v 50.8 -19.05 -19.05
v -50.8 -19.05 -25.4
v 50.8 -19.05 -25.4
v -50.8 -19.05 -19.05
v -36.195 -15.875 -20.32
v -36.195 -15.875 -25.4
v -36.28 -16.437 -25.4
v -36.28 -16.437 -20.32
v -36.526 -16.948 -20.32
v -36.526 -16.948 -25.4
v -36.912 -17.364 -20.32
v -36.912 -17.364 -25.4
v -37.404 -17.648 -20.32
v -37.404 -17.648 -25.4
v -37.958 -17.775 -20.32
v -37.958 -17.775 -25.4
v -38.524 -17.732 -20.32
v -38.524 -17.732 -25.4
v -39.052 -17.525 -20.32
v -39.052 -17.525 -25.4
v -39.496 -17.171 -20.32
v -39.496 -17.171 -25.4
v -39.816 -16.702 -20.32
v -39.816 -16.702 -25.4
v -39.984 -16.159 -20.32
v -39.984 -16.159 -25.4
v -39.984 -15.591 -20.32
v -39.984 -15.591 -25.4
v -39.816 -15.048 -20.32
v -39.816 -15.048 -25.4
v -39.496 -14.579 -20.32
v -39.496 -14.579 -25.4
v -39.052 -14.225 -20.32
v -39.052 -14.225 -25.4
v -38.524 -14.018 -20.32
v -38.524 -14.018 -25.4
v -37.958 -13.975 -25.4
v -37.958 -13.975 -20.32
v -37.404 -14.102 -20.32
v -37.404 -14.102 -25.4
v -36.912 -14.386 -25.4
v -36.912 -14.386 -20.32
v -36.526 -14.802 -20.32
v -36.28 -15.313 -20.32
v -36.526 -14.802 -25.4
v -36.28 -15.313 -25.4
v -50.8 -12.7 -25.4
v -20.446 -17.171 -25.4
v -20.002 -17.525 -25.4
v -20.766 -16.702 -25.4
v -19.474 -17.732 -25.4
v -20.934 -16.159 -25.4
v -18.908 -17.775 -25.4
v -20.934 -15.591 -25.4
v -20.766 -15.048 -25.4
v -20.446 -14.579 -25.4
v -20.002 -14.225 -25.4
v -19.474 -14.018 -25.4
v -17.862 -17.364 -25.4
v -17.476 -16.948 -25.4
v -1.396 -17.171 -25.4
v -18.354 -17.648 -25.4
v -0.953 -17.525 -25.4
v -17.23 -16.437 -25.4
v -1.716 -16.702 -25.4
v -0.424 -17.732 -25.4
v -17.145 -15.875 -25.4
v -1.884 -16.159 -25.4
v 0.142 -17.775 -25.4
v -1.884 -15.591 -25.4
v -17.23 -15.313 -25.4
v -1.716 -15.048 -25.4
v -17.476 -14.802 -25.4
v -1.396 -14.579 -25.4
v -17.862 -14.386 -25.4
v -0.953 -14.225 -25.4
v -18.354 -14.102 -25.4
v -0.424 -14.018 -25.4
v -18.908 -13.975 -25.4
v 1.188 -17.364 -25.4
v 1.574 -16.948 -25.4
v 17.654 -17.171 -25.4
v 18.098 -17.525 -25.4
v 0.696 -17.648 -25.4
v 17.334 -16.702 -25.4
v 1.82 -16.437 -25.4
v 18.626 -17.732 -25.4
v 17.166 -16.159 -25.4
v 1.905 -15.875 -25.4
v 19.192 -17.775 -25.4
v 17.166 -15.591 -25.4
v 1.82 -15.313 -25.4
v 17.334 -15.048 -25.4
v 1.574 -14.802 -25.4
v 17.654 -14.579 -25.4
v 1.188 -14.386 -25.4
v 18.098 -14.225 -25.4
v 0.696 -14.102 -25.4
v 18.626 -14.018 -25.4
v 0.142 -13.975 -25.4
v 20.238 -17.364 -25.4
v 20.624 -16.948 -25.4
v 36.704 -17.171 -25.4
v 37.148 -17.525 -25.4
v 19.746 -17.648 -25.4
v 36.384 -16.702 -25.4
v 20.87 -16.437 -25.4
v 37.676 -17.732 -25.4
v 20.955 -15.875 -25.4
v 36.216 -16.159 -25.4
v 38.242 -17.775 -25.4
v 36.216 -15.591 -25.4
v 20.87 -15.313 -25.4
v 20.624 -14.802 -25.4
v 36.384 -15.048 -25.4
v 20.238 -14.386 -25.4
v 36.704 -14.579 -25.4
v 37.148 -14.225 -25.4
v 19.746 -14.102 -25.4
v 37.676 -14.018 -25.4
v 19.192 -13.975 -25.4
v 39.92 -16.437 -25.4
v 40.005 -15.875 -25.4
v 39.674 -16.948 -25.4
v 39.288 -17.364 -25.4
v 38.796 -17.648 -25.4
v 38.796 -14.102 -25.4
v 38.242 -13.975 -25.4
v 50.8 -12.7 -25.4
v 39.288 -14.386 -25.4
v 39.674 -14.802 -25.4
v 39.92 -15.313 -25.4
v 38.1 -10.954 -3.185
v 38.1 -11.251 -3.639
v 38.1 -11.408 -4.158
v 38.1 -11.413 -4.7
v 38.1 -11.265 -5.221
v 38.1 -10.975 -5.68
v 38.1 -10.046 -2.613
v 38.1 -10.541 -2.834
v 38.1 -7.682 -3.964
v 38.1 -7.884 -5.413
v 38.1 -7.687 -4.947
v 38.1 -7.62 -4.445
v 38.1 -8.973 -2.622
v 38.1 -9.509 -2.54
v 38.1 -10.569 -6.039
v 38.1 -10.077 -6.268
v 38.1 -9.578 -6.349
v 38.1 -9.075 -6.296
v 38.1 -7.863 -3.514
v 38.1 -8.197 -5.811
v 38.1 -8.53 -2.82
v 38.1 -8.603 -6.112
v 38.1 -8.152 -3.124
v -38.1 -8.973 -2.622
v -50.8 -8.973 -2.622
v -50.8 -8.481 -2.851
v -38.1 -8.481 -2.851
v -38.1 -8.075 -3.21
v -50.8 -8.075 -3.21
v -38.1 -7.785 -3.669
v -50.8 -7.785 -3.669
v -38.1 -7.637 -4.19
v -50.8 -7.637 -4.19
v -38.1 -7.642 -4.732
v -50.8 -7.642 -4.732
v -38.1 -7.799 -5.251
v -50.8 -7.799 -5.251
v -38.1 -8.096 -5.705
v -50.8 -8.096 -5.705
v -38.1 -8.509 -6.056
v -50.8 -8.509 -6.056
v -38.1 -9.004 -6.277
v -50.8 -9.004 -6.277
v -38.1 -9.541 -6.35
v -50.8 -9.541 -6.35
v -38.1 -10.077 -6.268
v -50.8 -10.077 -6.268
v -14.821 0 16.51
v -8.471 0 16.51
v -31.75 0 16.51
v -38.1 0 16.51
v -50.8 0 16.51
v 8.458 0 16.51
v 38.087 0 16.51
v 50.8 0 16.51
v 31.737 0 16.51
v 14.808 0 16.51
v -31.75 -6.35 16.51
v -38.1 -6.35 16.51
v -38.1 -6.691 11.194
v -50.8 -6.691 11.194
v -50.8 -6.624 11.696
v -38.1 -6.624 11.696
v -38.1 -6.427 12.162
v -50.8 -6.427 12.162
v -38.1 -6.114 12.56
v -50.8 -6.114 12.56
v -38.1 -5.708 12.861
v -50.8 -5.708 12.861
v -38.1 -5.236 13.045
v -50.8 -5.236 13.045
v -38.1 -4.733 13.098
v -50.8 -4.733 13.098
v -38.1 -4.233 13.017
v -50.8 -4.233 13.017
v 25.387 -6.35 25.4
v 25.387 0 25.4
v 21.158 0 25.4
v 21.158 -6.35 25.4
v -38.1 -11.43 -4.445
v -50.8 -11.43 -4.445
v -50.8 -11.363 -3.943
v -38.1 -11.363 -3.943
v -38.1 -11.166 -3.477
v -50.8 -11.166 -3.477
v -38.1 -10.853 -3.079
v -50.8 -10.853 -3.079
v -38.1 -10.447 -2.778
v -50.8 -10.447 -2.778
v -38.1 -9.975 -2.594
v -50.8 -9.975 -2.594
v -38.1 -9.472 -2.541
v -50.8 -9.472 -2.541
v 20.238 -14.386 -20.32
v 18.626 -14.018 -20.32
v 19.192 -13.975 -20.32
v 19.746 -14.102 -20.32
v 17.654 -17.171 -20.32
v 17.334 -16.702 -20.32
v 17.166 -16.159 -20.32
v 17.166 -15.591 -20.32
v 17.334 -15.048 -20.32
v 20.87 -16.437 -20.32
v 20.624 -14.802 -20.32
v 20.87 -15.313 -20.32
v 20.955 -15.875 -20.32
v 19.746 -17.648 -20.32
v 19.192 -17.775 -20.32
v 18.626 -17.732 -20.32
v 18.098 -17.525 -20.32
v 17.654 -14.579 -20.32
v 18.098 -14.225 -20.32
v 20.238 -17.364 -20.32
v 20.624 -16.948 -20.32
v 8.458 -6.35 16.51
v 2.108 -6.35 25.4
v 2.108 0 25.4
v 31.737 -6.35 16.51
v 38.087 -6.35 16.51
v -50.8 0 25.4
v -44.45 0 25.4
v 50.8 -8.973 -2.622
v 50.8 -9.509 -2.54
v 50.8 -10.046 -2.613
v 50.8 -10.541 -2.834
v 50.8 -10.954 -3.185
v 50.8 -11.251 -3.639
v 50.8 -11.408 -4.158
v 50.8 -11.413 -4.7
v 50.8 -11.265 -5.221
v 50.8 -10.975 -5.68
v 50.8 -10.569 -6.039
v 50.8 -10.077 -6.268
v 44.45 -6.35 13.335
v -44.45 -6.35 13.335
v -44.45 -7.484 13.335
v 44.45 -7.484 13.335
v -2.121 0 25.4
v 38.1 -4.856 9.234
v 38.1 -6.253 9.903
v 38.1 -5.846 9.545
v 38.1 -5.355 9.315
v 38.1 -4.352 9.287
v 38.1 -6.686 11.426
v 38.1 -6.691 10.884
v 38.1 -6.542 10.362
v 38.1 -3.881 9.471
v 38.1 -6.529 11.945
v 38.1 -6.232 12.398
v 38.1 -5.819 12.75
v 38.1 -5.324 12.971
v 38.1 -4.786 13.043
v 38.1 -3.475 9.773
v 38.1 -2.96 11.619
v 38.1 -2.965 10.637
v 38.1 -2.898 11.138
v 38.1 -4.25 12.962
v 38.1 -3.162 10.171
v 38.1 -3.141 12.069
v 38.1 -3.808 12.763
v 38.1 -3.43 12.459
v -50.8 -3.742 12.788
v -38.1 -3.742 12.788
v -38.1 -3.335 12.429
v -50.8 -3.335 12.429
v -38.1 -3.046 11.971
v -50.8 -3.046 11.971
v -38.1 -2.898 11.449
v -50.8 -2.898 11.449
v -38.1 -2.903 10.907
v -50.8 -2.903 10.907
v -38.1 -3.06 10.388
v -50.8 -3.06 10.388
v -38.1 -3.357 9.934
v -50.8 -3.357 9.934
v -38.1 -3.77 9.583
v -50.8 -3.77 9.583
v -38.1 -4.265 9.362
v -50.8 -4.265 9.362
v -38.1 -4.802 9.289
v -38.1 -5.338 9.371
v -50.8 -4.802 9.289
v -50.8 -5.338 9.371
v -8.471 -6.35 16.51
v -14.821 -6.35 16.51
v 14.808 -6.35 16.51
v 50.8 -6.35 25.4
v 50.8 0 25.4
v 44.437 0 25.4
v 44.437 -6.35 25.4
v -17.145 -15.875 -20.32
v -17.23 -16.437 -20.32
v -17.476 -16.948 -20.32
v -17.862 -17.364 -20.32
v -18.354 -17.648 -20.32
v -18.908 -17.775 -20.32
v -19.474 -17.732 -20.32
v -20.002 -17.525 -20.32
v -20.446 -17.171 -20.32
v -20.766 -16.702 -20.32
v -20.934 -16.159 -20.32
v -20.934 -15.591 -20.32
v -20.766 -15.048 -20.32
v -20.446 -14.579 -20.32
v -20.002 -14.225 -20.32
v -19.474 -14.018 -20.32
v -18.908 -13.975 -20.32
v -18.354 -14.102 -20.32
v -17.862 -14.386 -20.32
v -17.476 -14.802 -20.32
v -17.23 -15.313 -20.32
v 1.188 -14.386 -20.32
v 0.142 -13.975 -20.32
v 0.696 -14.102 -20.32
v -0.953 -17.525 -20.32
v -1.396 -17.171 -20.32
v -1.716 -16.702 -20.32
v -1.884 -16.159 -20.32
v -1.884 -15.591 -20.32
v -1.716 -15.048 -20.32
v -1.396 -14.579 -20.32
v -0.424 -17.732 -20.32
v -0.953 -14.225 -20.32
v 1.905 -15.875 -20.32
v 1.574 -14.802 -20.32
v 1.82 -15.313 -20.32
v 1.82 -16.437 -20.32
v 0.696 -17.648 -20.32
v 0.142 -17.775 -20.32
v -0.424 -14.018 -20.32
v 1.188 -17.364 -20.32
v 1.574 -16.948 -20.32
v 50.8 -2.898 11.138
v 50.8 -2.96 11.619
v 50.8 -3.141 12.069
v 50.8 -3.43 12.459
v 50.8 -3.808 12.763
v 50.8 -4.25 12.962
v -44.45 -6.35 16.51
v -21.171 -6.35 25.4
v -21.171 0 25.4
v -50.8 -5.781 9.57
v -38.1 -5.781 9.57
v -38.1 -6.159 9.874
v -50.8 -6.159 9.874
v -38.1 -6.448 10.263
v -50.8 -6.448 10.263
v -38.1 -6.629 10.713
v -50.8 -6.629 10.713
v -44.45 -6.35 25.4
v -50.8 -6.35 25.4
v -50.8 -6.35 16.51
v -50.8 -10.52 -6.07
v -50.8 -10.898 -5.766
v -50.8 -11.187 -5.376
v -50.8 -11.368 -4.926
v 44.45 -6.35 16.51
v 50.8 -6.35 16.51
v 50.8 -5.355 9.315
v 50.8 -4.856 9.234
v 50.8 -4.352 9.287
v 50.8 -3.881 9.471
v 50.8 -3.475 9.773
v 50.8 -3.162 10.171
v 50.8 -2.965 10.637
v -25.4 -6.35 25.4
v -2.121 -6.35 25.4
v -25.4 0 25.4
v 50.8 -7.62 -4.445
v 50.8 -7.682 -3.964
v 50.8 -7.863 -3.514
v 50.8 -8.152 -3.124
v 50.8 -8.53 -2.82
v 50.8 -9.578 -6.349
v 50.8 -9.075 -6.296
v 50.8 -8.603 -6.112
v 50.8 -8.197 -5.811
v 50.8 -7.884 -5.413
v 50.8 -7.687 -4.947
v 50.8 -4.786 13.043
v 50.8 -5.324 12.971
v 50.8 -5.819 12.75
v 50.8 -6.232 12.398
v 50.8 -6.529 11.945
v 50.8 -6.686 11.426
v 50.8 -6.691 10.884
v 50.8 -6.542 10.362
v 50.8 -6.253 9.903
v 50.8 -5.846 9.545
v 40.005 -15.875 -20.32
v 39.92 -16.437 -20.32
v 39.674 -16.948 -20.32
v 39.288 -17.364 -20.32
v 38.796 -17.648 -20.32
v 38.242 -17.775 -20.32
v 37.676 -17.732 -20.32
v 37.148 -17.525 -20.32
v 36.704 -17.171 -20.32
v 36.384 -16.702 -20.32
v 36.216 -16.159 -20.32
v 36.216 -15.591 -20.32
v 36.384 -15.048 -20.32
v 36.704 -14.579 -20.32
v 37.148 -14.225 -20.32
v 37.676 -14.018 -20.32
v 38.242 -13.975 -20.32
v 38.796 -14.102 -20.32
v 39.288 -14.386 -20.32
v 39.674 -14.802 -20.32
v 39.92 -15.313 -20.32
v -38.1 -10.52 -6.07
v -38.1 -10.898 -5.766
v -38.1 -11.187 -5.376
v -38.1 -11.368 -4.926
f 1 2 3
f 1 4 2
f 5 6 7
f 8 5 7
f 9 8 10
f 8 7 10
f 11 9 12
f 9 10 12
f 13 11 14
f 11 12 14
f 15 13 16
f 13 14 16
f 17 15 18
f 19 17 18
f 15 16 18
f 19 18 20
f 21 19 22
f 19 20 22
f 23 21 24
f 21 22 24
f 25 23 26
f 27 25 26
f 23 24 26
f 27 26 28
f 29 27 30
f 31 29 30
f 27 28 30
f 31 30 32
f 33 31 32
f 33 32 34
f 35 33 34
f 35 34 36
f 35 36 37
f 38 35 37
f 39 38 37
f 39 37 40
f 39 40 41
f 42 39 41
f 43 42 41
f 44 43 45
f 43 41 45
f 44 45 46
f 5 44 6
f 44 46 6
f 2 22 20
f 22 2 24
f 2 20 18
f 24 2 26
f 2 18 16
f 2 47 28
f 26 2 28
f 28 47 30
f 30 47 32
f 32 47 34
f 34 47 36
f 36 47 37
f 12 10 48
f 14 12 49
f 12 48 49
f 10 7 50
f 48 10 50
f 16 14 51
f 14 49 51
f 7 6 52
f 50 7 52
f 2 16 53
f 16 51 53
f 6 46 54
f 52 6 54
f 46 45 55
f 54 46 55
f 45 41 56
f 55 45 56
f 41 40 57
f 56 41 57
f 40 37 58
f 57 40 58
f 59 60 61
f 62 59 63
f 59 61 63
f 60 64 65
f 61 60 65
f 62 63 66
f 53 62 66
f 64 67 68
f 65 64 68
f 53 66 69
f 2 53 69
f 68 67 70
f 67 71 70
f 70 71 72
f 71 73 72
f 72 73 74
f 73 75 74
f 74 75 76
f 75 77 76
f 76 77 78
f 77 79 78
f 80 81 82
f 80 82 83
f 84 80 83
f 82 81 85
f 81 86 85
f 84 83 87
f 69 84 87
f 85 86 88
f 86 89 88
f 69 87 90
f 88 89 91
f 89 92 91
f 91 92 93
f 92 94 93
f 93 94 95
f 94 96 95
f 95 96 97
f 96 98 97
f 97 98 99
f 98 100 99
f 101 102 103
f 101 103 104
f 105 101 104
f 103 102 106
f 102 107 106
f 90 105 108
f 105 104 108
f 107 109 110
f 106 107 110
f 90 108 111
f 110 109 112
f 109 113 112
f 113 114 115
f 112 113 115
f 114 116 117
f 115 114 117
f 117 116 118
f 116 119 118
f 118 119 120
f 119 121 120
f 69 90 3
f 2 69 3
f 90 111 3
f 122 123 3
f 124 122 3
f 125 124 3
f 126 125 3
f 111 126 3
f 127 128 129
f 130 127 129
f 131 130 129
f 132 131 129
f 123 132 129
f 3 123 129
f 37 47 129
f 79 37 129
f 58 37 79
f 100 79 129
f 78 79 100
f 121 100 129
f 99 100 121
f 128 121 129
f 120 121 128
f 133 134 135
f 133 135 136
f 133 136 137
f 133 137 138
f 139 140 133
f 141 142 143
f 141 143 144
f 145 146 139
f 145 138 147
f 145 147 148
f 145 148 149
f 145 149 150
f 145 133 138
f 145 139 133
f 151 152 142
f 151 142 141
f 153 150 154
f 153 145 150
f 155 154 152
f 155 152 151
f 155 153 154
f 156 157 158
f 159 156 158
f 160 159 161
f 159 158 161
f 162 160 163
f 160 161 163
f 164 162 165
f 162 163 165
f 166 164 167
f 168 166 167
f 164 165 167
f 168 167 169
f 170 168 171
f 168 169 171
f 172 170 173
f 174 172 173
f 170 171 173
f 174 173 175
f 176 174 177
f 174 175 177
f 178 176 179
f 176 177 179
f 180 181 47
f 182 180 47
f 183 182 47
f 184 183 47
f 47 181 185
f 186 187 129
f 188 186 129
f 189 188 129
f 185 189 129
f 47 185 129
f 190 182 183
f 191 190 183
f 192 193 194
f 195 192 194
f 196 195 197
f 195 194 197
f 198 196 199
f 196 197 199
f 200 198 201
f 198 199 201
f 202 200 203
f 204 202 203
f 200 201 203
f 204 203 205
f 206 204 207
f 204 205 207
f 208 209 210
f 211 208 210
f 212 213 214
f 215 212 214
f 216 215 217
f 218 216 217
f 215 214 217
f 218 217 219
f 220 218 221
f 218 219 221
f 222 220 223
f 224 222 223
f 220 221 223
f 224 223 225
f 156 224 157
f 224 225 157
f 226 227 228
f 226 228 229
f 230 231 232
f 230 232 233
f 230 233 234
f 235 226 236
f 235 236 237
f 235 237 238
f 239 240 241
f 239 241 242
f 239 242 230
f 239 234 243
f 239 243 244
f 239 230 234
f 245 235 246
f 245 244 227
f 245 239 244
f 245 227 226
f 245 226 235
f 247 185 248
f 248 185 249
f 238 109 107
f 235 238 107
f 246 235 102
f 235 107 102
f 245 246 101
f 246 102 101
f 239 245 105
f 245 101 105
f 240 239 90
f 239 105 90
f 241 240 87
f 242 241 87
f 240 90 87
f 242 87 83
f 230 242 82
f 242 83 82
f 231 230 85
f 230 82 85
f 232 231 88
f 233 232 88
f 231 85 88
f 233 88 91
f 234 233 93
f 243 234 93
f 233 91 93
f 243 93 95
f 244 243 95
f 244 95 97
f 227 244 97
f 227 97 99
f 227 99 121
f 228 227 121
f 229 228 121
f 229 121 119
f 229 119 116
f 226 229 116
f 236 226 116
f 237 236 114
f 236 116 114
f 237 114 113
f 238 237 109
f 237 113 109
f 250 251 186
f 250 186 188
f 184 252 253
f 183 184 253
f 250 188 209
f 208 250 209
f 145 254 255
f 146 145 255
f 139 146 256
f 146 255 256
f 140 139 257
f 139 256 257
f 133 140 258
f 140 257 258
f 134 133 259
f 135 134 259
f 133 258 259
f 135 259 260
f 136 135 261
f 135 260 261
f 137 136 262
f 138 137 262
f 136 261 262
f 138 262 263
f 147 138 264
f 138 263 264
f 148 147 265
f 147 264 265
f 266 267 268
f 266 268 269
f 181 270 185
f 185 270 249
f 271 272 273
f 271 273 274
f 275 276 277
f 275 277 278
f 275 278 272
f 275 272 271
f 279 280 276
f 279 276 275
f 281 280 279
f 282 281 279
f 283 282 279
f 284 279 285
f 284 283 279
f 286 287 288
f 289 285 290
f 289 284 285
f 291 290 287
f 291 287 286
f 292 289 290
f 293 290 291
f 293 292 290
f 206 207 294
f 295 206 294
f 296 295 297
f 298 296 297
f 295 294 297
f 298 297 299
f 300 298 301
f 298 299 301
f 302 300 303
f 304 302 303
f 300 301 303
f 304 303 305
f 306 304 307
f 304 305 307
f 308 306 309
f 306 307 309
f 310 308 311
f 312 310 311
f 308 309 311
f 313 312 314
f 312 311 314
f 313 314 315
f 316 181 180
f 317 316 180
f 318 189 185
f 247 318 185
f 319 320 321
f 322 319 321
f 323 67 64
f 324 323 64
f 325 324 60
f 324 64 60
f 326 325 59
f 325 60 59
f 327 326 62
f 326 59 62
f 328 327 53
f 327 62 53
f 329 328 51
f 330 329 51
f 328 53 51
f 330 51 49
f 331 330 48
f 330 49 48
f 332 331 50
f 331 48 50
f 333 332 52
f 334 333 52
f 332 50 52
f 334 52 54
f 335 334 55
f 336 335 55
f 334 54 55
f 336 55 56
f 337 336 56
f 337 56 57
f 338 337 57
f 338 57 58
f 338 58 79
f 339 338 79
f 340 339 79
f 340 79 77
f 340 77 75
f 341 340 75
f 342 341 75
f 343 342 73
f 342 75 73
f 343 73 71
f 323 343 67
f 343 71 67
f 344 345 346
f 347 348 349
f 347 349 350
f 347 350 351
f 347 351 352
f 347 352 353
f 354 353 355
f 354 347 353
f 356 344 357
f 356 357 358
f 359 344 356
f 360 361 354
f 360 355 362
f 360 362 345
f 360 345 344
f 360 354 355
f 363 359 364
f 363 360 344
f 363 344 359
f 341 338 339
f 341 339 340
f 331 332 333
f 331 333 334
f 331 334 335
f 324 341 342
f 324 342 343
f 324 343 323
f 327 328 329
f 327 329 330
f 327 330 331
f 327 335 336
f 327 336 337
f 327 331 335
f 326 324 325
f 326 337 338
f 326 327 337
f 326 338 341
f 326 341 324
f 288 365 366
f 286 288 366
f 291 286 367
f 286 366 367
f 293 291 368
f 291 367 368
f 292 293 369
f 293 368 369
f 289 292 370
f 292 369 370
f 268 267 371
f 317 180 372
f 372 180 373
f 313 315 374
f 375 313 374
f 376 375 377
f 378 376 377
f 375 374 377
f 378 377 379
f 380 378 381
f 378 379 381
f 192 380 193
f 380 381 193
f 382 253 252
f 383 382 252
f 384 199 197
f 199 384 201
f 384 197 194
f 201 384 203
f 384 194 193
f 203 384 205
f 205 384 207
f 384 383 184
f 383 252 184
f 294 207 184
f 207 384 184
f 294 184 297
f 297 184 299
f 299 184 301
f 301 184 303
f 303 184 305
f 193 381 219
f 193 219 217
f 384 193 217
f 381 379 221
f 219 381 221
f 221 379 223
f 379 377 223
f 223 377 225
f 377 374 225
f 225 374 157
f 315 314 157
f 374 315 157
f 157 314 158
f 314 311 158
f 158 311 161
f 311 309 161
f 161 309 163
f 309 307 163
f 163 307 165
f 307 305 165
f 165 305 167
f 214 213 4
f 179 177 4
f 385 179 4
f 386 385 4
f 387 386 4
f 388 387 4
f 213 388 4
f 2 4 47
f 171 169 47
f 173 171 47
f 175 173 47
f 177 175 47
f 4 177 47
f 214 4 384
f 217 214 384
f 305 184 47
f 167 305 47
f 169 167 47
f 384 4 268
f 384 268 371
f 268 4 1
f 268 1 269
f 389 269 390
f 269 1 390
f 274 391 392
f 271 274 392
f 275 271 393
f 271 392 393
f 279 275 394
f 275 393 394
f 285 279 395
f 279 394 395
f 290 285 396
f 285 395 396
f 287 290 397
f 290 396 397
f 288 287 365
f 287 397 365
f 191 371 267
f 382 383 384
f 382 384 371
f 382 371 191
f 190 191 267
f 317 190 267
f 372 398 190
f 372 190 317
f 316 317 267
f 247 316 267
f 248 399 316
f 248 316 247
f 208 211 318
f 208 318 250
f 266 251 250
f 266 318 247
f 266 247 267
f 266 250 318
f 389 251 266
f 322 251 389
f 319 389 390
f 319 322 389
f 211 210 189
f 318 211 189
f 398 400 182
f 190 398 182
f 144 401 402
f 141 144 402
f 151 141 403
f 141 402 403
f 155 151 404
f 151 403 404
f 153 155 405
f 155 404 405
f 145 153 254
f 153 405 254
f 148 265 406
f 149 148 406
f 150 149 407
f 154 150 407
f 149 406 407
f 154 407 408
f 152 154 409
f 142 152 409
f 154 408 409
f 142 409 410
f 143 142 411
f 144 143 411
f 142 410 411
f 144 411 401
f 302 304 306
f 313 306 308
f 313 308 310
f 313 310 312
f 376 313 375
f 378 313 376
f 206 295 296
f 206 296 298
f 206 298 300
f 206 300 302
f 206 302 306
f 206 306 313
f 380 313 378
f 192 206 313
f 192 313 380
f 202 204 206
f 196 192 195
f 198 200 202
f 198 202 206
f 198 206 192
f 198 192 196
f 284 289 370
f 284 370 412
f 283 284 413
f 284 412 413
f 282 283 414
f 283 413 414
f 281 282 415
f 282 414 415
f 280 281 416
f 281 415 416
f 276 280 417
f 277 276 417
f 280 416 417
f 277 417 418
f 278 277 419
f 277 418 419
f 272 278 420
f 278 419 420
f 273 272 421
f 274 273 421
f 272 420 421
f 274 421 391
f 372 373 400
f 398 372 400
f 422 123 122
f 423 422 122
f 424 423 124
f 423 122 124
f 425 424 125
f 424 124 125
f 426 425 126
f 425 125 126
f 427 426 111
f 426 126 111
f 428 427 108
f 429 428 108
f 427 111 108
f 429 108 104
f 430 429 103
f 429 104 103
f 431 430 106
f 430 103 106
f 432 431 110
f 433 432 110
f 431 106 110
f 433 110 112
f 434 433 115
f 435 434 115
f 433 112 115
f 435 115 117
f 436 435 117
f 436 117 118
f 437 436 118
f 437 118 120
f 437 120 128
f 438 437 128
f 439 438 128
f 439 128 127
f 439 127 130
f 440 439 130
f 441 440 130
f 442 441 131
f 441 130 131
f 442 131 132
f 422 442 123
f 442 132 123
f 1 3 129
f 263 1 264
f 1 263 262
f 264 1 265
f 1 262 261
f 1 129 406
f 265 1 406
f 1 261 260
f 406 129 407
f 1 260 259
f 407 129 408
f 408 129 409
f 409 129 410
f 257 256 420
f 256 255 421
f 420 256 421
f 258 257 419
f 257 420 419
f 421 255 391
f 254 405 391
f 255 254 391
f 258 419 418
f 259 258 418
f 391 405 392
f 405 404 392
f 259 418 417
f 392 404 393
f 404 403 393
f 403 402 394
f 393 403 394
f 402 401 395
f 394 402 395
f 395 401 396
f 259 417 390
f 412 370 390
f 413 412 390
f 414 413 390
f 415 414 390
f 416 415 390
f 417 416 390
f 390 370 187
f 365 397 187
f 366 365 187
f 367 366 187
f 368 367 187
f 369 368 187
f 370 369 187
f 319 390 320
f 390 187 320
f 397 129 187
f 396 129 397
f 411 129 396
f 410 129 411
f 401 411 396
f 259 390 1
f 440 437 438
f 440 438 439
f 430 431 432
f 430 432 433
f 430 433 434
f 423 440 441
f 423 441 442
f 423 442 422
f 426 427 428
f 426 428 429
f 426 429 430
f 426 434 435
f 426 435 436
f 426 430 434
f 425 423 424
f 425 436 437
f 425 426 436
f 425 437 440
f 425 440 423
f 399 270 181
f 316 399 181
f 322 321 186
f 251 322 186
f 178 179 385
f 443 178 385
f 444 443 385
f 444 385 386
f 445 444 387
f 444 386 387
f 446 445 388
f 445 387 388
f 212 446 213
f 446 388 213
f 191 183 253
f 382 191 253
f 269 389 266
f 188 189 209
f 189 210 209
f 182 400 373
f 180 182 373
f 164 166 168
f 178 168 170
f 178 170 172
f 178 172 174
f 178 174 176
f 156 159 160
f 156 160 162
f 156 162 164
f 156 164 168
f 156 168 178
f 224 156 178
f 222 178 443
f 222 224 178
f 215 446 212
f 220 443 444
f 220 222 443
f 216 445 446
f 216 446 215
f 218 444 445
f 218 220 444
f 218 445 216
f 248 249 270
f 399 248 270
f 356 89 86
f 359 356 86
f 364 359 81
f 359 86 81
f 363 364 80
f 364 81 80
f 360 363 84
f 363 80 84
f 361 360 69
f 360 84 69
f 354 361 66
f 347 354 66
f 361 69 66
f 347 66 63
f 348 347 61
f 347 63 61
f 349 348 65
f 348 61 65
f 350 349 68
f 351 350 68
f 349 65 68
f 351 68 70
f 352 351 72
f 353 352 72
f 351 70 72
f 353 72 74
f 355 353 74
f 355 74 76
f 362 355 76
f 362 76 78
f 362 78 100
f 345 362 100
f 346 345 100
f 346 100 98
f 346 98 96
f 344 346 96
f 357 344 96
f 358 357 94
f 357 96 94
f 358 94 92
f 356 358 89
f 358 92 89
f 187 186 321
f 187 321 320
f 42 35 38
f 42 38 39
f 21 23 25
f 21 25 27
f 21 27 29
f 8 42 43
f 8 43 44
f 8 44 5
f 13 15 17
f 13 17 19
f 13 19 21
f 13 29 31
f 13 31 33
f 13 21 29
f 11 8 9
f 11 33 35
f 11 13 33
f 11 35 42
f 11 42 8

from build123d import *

# Parameters (mm, degrees)
F1_DEPTH  = 6.35
F0_W      = 88.9
F0_H      = 32.385
F2_DEPTH  = 19.05
F5_DEPTH  = 101.6
F6_DEPTH  = 12.7
F9_DEPTH  = 12.7
F11_R     = 1.905
F12_DEPTH = 5.08


# Not quite as in the source:
# - a feature names something its author has since deleted; it is built from what else it names


with BuildPart() as f1:
    # F0 (on Front) → F1 (new body)
    with BuildSketch(Plane.XZ):
        Polygon((50.8, 16.51), (50.8, 25.4), (44.4373, 25.4), (38.0873, 16.51), (31.7373, 16.51), (25.3873, 25.4), (21.1582, 25.4), (14.8082, 16.51), (8.4582, 16.51), (2.1082, 25.4), (-2.1209, 25.4), (-8.4709, 16.51), (-14.8209, 16.51), (-21.1709, 25.4), (-25.4, 25.4), (-31.75, 16.51), (-38.1, 16.51), (-44.45, 25.4), (-50.8, 25.4), (-50.8, 16.51), (-44.45, 16.51), (-44.45, 13.335), (44.45, 13.335), (44.45, 16.51), align=None)
    extrude(amount=F1_DEPTH)

    # F0 (on Front) → F2 (join)
    with BuildSketch(Plane.XZ):
        Polygon((50.8, -25.4), (50.8, 16.51), (44.45, 16.51), (44.45, 13.335), (44.45, -19.05), (-44.45, -19.05), (-44.45, 13.335), (-44.45, 16.51), (-50.8, 16.51), (-50.8, -25.4), (-44.45, -25.4), (44.45, -25.4), align=None)
        with Locations((0, -2.8575)):
            Rectangle(F0_W, F0_H)
    extrude(amount=F2_DEPTH)

    # F4 (on offset) → F5 (cut)
    with BuildSketch(Plane.YZ.offset(50.8)):
        Polygon((-12.7, -25.4), (0, -25.4), (0, 16.51), align=None)
        Polygon((-6.35, 16.51), (-6.35, 25.4), (-19.05, 25.4), (-19.05, -19.05), align=None)
    extrude(amount=-F5_DEPTH, mode=Mode.SUBTRACT)

    # F4 (on offset) → F6 (cut)
    with BuildSketch(Plane.YZ.offset(50.8)):
        with BuildLine():
            ThreePointArc((-8.972535912, -2.6218685096), (-11.3481314904, -3.892535912), (-10.077464088, -6.2681314904))
            ThreePointArc((-10.077464088, -6.2681314904), (-8.3899711651, -5.9749459284), (-7.62, -4.445))
            ThreePointArc((-7.62, -4.445), (-7.9950540716, -3.3099711651), (-8.972535912, -2.6218685096))
        make_face()
        with BuildLine():
            ThreePointArc((-2.897765424, 11.1383741007), (-3.2728194956, 12.2734029356), (-4.250301336, 12.9615055911))
            ThreePointArc((-4.250301336, 12.9615055911), (-6.6258969145, 11.6908381887), (-5.3552295121, 9.3152426102))
            ThreePointArc((-5.3552295121, 9.3152426102), (-3.6677365891, 9.6084281723), (-2.897765424, 11.1383741007))
        make_face()
    extrude(amount=-F6_DEPTH, mode=Mode.SUBTRACT)

    # F8 (on offset) → F9 (cut)
    with BuildSketch(Plane(origin=(-50.8, 0, 0), x_dir=(0, -1, 0), z_dir=(-1, 0, 0))):
        with BuildLine():
            ThreePointArc((4.2333912752, 13.0173087917), (2.9627238728, 10.6417132133), (5.3383194513, 9.3710458109))
            ThreePointArc((5.3383194513, 9.3710458109), (6.3158012916, 10.0591484663), (6.6908553632, 11.1941773013))
            ThreePointArc((6.6908553632, 11.1941773013), (5.9208841982, 12.7241232297), (4.2333912752, 13.0173087917))
        make_face()
        with BuildLine():
            ThreePointArc((8.972535912, -2.6218685096), (7.7018685096, -4.997464088), (10.077464088, -6.2681314904))
            ThreePointArc((10.077464088, -6.2681314904), (11.0549459284, -5.5800288349), (11.43, -4.445))
            ThreePointArc((11.43, -4.445), (10.6600288349, -2.9150540716), (8.972535912, -2.6218685096))
        make_face()
    extrude(amount=-F9_DEPTH, mode=Mode.SUBTRACT)

    # F11 (on offset) → F12 (cut)
    with BuildSketch(Plane(origin=(0, 0, -25.4), x_dir=(1, 0, 0), z_dir=(0, 0, -1))):
        with Locations((-38.1, 15.875)):
            Circle(F11_R)
        with Locations((-19.05, 15.875)):
            Circle(F11_R)
        with Locations((0, 15.875)):
            Circle(F11_R)
        with Locations((19.05, 15.875)):
            Circle(F11_R)
        with Locations((38.1, 15.875)):
            Circle(F11_R)
    extrude(amount=-F12_DEPTH, mode=Mode.SUBTRACT)


solid = f1.part
